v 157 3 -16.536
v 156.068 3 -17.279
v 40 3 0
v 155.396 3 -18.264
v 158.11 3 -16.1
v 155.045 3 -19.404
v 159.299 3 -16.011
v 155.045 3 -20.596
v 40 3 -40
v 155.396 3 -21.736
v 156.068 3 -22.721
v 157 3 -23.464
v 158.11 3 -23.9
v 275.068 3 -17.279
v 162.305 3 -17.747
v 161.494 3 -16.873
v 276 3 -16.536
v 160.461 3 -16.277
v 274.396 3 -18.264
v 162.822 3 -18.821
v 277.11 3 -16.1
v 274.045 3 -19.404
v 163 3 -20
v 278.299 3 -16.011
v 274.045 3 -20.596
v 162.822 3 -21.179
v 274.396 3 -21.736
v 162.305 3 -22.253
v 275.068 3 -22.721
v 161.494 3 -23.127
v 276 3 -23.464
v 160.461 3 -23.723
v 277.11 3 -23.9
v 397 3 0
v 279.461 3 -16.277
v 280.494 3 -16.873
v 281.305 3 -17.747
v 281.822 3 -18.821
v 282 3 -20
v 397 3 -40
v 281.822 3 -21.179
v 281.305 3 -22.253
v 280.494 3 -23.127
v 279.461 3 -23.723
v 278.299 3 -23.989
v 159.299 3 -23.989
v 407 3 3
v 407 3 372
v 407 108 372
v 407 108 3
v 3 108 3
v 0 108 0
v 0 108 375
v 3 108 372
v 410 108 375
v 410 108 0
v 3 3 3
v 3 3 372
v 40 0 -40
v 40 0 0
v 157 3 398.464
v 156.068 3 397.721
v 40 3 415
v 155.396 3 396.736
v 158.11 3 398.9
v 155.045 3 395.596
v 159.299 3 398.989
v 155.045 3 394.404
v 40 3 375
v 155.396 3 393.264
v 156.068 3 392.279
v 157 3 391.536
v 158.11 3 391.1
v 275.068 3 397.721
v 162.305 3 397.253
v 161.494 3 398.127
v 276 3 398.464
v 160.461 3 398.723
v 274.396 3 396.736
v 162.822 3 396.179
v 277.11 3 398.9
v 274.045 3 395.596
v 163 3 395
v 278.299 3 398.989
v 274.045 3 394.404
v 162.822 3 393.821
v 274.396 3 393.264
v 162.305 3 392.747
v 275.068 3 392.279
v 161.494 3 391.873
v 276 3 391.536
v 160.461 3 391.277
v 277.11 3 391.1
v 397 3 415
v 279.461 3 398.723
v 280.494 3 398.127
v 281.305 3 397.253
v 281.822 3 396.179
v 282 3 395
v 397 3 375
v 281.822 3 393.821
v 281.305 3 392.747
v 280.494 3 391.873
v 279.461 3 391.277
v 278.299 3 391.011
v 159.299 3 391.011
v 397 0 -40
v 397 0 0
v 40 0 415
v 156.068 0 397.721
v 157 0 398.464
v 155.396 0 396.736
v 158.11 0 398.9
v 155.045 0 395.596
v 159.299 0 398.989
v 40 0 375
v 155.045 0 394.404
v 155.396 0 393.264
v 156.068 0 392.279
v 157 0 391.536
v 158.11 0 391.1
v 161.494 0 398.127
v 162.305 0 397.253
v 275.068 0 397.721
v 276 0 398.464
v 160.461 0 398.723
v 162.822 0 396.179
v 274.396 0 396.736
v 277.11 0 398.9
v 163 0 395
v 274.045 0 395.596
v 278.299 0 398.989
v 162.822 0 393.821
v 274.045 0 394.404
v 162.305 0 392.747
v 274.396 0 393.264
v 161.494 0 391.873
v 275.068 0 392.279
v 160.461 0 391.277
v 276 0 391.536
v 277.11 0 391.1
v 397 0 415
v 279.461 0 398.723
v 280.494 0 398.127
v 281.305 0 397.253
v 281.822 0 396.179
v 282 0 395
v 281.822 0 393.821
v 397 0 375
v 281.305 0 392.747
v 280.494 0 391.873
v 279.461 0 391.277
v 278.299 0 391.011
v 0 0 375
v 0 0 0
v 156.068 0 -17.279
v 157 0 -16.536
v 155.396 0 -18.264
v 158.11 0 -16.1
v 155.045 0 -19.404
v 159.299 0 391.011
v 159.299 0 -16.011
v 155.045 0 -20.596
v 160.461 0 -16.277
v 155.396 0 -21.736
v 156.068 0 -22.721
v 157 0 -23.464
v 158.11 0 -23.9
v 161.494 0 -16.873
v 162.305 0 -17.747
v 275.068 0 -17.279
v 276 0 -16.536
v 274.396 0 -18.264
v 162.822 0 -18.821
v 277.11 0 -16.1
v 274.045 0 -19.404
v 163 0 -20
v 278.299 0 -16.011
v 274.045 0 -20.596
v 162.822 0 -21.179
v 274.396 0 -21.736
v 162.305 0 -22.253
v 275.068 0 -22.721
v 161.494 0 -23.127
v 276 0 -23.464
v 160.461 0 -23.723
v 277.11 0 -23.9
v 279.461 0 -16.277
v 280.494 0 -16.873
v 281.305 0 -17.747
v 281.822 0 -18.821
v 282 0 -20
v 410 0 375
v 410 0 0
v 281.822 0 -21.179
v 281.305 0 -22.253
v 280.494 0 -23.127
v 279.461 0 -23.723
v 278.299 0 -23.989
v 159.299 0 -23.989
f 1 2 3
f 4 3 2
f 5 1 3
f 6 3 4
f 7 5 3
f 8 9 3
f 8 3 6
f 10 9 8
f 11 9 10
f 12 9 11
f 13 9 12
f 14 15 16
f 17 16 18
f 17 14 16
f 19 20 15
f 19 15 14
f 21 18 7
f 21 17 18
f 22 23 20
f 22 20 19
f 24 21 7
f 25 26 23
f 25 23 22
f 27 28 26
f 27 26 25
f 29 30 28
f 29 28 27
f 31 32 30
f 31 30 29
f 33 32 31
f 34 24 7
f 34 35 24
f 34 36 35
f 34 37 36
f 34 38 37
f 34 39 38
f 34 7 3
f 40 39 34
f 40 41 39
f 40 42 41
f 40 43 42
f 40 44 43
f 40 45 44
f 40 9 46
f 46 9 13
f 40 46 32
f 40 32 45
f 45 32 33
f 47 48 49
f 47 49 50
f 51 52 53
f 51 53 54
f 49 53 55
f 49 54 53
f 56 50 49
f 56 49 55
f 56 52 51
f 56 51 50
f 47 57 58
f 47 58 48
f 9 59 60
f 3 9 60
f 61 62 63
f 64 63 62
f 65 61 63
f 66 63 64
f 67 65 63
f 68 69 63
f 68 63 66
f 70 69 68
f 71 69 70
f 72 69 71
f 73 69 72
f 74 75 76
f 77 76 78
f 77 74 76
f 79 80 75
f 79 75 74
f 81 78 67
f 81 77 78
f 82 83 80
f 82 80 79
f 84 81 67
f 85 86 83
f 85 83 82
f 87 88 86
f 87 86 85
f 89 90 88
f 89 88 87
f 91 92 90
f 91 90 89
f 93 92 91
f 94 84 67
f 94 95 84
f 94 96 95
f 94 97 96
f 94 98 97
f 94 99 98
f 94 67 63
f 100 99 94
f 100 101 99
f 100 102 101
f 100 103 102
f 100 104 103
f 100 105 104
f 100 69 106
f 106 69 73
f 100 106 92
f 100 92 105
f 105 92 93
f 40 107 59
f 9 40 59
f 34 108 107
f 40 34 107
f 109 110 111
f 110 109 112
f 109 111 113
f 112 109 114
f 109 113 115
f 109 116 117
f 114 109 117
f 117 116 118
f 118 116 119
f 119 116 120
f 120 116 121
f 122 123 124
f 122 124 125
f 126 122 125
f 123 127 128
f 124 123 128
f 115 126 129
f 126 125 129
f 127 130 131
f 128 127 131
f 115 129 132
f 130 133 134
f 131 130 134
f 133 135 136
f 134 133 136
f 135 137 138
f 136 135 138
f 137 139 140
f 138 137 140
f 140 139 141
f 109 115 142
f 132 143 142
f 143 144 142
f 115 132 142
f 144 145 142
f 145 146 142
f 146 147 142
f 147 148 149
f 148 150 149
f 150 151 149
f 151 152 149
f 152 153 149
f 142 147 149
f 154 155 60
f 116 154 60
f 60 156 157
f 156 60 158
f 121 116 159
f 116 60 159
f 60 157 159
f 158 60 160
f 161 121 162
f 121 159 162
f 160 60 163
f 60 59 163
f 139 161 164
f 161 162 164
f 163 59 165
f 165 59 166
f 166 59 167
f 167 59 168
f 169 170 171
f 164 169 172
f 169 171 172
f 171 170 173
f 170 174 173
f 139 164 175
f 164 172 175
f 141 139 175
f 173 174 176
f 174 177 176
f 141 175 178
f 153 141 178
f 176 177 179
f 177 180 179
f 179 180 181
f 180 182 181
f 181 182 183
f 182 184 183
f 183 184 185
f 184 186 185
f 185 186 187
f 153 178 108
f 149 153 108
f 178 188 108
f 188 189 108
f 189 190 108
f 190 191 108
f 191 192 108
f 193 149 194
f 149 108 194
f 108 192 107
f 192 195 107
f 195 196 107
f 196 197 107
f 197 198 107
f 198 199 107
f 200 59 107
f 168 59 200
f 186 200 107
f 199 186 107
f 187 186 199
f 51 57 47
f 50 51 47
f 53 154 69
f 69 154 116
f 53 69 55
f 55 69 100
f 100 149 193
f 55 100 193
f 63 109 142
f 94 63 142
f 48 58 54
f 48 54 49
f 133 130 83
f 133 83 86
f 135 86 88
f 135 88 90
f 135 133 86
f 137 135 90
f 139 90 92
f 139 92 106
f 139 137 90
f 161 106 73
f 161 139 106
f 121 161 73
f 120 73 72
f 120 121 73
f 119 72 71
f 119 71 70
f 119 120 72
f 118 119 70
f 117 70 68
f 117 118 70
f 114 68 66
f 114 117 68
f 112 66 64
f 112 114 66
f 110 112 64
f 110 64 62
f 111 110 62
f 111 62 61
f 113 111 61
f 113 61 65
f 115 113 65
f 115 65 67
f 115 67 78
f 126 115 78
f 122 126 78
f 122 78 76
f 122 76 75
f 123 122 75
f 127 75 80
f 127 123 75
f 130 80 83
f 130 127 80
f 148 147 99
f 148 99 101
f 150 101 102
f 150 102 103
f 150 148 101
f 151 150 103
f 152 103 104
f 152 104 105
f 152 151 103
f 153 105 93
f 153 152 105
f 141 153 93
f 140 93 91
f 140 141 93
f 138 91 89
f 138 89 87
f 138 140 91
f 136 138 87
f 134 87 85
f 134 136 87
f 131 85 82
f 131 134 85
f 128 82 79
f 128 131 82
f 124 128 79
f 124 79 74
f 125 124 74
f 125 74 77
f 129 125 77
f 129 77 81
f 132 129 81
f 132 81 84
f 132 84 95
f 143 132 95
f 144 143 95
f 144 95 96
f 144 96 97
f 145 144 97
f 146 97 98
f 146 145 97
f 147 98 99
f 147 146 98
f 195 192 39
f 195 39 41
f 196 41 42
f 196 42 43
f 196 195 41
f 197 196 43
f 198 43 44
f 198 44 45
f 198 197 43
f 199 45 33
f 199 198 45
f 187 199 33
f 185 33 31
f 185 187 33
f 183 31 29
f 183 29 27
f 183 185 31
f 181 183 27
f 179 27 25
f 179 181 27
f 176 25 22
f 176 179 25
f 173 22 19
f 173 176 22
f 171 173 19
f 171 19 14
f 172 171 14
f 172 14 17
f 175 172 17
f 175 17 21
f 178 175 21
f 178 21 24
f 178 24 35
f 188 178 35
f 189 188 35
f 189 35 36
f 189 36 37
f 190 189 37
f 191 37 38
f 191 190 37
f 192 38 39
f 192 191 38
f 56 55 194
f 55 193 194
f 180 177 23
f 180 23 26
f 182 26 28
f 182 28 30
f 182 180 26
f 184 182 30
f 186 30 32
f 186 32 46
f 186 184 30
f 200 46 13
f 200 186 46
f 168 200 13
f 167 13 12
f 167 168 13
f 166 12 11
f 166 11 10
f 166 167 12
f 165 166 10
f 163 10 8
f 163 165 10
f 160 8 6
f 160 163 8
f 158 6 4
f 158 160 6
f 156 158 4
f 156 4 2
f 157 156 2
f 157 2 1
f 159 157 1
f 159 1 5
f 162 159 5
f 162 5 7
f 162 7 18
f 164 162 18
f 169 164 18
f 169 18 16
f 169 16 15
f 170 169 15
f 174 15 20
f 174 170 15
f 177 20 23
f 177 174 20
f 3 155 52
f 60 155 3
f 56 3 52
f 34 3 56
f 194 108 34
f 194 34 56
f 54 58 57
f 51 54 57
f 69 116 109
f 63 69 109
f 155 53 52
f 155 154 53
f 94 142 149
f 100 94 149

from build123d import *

# Parameters (mm, degrees)
SKETCH_1_R      = 4
EXTRUDE_2_DEPTH = 3
SKETCH_2_W      = 410
SKETCH_2_H      = 375
SKETCH_2_W_2    = 404
SKETCH_2_H_2    = 369
EXTRUDE_3_DEPTH = 105


with BuildPart() as part:
    # 草圖1 → 填料-伸長2 (new body)
    with BuildSketch(Plane(origin=(0, 0, 0), x_dir=(1, 0, 0), z_dir=(0, 1, 0))):
        Polygon((0, 0), (0, -375), (40, -375), (40, -415), (397, -415), (397, -375), (410, -375), (410, 0), (397, 0), (397, 40), (40, 40), (40, 0), align=None)
        with Locations((159, 20)):
            Circle(SKETCH_1_R, mode=Mode.SUBTRACT)
        with Locations((278, 20)):
            Circle(SKETCH_1_R, mode=Mode.SUBTRACT)
        with Locations((278, -395)):
            Circle(SKETCH_1_R, mode=Mode.SUBTRACT)
        with Locations((159, -395)):
            Circle(SKETCH_1_R, mode=Mode.SUBTRACT)
    extrude(amount=EXTRUDE_2_DEPTH)

    # 草圖2 → 填料-伸長3 (add)
    with BuildSketch(Plane(origin=(0, 3, 0), x_dir=(1, 0, 0), z_dir=(0, 1, 0))):
        with Locations((205, -187.5)):
            Rectangle(SKETCH_2_W, SKETCH_2_H)
        with Locations((205, -187.5)):
            Rectangle(SKETCH_2_W_2, SKETCH_2_H_2, mode=Mode.SUBTRACT)
    extrude(amount=EXTRUDE_3_DEPTH)


solid = part.part
